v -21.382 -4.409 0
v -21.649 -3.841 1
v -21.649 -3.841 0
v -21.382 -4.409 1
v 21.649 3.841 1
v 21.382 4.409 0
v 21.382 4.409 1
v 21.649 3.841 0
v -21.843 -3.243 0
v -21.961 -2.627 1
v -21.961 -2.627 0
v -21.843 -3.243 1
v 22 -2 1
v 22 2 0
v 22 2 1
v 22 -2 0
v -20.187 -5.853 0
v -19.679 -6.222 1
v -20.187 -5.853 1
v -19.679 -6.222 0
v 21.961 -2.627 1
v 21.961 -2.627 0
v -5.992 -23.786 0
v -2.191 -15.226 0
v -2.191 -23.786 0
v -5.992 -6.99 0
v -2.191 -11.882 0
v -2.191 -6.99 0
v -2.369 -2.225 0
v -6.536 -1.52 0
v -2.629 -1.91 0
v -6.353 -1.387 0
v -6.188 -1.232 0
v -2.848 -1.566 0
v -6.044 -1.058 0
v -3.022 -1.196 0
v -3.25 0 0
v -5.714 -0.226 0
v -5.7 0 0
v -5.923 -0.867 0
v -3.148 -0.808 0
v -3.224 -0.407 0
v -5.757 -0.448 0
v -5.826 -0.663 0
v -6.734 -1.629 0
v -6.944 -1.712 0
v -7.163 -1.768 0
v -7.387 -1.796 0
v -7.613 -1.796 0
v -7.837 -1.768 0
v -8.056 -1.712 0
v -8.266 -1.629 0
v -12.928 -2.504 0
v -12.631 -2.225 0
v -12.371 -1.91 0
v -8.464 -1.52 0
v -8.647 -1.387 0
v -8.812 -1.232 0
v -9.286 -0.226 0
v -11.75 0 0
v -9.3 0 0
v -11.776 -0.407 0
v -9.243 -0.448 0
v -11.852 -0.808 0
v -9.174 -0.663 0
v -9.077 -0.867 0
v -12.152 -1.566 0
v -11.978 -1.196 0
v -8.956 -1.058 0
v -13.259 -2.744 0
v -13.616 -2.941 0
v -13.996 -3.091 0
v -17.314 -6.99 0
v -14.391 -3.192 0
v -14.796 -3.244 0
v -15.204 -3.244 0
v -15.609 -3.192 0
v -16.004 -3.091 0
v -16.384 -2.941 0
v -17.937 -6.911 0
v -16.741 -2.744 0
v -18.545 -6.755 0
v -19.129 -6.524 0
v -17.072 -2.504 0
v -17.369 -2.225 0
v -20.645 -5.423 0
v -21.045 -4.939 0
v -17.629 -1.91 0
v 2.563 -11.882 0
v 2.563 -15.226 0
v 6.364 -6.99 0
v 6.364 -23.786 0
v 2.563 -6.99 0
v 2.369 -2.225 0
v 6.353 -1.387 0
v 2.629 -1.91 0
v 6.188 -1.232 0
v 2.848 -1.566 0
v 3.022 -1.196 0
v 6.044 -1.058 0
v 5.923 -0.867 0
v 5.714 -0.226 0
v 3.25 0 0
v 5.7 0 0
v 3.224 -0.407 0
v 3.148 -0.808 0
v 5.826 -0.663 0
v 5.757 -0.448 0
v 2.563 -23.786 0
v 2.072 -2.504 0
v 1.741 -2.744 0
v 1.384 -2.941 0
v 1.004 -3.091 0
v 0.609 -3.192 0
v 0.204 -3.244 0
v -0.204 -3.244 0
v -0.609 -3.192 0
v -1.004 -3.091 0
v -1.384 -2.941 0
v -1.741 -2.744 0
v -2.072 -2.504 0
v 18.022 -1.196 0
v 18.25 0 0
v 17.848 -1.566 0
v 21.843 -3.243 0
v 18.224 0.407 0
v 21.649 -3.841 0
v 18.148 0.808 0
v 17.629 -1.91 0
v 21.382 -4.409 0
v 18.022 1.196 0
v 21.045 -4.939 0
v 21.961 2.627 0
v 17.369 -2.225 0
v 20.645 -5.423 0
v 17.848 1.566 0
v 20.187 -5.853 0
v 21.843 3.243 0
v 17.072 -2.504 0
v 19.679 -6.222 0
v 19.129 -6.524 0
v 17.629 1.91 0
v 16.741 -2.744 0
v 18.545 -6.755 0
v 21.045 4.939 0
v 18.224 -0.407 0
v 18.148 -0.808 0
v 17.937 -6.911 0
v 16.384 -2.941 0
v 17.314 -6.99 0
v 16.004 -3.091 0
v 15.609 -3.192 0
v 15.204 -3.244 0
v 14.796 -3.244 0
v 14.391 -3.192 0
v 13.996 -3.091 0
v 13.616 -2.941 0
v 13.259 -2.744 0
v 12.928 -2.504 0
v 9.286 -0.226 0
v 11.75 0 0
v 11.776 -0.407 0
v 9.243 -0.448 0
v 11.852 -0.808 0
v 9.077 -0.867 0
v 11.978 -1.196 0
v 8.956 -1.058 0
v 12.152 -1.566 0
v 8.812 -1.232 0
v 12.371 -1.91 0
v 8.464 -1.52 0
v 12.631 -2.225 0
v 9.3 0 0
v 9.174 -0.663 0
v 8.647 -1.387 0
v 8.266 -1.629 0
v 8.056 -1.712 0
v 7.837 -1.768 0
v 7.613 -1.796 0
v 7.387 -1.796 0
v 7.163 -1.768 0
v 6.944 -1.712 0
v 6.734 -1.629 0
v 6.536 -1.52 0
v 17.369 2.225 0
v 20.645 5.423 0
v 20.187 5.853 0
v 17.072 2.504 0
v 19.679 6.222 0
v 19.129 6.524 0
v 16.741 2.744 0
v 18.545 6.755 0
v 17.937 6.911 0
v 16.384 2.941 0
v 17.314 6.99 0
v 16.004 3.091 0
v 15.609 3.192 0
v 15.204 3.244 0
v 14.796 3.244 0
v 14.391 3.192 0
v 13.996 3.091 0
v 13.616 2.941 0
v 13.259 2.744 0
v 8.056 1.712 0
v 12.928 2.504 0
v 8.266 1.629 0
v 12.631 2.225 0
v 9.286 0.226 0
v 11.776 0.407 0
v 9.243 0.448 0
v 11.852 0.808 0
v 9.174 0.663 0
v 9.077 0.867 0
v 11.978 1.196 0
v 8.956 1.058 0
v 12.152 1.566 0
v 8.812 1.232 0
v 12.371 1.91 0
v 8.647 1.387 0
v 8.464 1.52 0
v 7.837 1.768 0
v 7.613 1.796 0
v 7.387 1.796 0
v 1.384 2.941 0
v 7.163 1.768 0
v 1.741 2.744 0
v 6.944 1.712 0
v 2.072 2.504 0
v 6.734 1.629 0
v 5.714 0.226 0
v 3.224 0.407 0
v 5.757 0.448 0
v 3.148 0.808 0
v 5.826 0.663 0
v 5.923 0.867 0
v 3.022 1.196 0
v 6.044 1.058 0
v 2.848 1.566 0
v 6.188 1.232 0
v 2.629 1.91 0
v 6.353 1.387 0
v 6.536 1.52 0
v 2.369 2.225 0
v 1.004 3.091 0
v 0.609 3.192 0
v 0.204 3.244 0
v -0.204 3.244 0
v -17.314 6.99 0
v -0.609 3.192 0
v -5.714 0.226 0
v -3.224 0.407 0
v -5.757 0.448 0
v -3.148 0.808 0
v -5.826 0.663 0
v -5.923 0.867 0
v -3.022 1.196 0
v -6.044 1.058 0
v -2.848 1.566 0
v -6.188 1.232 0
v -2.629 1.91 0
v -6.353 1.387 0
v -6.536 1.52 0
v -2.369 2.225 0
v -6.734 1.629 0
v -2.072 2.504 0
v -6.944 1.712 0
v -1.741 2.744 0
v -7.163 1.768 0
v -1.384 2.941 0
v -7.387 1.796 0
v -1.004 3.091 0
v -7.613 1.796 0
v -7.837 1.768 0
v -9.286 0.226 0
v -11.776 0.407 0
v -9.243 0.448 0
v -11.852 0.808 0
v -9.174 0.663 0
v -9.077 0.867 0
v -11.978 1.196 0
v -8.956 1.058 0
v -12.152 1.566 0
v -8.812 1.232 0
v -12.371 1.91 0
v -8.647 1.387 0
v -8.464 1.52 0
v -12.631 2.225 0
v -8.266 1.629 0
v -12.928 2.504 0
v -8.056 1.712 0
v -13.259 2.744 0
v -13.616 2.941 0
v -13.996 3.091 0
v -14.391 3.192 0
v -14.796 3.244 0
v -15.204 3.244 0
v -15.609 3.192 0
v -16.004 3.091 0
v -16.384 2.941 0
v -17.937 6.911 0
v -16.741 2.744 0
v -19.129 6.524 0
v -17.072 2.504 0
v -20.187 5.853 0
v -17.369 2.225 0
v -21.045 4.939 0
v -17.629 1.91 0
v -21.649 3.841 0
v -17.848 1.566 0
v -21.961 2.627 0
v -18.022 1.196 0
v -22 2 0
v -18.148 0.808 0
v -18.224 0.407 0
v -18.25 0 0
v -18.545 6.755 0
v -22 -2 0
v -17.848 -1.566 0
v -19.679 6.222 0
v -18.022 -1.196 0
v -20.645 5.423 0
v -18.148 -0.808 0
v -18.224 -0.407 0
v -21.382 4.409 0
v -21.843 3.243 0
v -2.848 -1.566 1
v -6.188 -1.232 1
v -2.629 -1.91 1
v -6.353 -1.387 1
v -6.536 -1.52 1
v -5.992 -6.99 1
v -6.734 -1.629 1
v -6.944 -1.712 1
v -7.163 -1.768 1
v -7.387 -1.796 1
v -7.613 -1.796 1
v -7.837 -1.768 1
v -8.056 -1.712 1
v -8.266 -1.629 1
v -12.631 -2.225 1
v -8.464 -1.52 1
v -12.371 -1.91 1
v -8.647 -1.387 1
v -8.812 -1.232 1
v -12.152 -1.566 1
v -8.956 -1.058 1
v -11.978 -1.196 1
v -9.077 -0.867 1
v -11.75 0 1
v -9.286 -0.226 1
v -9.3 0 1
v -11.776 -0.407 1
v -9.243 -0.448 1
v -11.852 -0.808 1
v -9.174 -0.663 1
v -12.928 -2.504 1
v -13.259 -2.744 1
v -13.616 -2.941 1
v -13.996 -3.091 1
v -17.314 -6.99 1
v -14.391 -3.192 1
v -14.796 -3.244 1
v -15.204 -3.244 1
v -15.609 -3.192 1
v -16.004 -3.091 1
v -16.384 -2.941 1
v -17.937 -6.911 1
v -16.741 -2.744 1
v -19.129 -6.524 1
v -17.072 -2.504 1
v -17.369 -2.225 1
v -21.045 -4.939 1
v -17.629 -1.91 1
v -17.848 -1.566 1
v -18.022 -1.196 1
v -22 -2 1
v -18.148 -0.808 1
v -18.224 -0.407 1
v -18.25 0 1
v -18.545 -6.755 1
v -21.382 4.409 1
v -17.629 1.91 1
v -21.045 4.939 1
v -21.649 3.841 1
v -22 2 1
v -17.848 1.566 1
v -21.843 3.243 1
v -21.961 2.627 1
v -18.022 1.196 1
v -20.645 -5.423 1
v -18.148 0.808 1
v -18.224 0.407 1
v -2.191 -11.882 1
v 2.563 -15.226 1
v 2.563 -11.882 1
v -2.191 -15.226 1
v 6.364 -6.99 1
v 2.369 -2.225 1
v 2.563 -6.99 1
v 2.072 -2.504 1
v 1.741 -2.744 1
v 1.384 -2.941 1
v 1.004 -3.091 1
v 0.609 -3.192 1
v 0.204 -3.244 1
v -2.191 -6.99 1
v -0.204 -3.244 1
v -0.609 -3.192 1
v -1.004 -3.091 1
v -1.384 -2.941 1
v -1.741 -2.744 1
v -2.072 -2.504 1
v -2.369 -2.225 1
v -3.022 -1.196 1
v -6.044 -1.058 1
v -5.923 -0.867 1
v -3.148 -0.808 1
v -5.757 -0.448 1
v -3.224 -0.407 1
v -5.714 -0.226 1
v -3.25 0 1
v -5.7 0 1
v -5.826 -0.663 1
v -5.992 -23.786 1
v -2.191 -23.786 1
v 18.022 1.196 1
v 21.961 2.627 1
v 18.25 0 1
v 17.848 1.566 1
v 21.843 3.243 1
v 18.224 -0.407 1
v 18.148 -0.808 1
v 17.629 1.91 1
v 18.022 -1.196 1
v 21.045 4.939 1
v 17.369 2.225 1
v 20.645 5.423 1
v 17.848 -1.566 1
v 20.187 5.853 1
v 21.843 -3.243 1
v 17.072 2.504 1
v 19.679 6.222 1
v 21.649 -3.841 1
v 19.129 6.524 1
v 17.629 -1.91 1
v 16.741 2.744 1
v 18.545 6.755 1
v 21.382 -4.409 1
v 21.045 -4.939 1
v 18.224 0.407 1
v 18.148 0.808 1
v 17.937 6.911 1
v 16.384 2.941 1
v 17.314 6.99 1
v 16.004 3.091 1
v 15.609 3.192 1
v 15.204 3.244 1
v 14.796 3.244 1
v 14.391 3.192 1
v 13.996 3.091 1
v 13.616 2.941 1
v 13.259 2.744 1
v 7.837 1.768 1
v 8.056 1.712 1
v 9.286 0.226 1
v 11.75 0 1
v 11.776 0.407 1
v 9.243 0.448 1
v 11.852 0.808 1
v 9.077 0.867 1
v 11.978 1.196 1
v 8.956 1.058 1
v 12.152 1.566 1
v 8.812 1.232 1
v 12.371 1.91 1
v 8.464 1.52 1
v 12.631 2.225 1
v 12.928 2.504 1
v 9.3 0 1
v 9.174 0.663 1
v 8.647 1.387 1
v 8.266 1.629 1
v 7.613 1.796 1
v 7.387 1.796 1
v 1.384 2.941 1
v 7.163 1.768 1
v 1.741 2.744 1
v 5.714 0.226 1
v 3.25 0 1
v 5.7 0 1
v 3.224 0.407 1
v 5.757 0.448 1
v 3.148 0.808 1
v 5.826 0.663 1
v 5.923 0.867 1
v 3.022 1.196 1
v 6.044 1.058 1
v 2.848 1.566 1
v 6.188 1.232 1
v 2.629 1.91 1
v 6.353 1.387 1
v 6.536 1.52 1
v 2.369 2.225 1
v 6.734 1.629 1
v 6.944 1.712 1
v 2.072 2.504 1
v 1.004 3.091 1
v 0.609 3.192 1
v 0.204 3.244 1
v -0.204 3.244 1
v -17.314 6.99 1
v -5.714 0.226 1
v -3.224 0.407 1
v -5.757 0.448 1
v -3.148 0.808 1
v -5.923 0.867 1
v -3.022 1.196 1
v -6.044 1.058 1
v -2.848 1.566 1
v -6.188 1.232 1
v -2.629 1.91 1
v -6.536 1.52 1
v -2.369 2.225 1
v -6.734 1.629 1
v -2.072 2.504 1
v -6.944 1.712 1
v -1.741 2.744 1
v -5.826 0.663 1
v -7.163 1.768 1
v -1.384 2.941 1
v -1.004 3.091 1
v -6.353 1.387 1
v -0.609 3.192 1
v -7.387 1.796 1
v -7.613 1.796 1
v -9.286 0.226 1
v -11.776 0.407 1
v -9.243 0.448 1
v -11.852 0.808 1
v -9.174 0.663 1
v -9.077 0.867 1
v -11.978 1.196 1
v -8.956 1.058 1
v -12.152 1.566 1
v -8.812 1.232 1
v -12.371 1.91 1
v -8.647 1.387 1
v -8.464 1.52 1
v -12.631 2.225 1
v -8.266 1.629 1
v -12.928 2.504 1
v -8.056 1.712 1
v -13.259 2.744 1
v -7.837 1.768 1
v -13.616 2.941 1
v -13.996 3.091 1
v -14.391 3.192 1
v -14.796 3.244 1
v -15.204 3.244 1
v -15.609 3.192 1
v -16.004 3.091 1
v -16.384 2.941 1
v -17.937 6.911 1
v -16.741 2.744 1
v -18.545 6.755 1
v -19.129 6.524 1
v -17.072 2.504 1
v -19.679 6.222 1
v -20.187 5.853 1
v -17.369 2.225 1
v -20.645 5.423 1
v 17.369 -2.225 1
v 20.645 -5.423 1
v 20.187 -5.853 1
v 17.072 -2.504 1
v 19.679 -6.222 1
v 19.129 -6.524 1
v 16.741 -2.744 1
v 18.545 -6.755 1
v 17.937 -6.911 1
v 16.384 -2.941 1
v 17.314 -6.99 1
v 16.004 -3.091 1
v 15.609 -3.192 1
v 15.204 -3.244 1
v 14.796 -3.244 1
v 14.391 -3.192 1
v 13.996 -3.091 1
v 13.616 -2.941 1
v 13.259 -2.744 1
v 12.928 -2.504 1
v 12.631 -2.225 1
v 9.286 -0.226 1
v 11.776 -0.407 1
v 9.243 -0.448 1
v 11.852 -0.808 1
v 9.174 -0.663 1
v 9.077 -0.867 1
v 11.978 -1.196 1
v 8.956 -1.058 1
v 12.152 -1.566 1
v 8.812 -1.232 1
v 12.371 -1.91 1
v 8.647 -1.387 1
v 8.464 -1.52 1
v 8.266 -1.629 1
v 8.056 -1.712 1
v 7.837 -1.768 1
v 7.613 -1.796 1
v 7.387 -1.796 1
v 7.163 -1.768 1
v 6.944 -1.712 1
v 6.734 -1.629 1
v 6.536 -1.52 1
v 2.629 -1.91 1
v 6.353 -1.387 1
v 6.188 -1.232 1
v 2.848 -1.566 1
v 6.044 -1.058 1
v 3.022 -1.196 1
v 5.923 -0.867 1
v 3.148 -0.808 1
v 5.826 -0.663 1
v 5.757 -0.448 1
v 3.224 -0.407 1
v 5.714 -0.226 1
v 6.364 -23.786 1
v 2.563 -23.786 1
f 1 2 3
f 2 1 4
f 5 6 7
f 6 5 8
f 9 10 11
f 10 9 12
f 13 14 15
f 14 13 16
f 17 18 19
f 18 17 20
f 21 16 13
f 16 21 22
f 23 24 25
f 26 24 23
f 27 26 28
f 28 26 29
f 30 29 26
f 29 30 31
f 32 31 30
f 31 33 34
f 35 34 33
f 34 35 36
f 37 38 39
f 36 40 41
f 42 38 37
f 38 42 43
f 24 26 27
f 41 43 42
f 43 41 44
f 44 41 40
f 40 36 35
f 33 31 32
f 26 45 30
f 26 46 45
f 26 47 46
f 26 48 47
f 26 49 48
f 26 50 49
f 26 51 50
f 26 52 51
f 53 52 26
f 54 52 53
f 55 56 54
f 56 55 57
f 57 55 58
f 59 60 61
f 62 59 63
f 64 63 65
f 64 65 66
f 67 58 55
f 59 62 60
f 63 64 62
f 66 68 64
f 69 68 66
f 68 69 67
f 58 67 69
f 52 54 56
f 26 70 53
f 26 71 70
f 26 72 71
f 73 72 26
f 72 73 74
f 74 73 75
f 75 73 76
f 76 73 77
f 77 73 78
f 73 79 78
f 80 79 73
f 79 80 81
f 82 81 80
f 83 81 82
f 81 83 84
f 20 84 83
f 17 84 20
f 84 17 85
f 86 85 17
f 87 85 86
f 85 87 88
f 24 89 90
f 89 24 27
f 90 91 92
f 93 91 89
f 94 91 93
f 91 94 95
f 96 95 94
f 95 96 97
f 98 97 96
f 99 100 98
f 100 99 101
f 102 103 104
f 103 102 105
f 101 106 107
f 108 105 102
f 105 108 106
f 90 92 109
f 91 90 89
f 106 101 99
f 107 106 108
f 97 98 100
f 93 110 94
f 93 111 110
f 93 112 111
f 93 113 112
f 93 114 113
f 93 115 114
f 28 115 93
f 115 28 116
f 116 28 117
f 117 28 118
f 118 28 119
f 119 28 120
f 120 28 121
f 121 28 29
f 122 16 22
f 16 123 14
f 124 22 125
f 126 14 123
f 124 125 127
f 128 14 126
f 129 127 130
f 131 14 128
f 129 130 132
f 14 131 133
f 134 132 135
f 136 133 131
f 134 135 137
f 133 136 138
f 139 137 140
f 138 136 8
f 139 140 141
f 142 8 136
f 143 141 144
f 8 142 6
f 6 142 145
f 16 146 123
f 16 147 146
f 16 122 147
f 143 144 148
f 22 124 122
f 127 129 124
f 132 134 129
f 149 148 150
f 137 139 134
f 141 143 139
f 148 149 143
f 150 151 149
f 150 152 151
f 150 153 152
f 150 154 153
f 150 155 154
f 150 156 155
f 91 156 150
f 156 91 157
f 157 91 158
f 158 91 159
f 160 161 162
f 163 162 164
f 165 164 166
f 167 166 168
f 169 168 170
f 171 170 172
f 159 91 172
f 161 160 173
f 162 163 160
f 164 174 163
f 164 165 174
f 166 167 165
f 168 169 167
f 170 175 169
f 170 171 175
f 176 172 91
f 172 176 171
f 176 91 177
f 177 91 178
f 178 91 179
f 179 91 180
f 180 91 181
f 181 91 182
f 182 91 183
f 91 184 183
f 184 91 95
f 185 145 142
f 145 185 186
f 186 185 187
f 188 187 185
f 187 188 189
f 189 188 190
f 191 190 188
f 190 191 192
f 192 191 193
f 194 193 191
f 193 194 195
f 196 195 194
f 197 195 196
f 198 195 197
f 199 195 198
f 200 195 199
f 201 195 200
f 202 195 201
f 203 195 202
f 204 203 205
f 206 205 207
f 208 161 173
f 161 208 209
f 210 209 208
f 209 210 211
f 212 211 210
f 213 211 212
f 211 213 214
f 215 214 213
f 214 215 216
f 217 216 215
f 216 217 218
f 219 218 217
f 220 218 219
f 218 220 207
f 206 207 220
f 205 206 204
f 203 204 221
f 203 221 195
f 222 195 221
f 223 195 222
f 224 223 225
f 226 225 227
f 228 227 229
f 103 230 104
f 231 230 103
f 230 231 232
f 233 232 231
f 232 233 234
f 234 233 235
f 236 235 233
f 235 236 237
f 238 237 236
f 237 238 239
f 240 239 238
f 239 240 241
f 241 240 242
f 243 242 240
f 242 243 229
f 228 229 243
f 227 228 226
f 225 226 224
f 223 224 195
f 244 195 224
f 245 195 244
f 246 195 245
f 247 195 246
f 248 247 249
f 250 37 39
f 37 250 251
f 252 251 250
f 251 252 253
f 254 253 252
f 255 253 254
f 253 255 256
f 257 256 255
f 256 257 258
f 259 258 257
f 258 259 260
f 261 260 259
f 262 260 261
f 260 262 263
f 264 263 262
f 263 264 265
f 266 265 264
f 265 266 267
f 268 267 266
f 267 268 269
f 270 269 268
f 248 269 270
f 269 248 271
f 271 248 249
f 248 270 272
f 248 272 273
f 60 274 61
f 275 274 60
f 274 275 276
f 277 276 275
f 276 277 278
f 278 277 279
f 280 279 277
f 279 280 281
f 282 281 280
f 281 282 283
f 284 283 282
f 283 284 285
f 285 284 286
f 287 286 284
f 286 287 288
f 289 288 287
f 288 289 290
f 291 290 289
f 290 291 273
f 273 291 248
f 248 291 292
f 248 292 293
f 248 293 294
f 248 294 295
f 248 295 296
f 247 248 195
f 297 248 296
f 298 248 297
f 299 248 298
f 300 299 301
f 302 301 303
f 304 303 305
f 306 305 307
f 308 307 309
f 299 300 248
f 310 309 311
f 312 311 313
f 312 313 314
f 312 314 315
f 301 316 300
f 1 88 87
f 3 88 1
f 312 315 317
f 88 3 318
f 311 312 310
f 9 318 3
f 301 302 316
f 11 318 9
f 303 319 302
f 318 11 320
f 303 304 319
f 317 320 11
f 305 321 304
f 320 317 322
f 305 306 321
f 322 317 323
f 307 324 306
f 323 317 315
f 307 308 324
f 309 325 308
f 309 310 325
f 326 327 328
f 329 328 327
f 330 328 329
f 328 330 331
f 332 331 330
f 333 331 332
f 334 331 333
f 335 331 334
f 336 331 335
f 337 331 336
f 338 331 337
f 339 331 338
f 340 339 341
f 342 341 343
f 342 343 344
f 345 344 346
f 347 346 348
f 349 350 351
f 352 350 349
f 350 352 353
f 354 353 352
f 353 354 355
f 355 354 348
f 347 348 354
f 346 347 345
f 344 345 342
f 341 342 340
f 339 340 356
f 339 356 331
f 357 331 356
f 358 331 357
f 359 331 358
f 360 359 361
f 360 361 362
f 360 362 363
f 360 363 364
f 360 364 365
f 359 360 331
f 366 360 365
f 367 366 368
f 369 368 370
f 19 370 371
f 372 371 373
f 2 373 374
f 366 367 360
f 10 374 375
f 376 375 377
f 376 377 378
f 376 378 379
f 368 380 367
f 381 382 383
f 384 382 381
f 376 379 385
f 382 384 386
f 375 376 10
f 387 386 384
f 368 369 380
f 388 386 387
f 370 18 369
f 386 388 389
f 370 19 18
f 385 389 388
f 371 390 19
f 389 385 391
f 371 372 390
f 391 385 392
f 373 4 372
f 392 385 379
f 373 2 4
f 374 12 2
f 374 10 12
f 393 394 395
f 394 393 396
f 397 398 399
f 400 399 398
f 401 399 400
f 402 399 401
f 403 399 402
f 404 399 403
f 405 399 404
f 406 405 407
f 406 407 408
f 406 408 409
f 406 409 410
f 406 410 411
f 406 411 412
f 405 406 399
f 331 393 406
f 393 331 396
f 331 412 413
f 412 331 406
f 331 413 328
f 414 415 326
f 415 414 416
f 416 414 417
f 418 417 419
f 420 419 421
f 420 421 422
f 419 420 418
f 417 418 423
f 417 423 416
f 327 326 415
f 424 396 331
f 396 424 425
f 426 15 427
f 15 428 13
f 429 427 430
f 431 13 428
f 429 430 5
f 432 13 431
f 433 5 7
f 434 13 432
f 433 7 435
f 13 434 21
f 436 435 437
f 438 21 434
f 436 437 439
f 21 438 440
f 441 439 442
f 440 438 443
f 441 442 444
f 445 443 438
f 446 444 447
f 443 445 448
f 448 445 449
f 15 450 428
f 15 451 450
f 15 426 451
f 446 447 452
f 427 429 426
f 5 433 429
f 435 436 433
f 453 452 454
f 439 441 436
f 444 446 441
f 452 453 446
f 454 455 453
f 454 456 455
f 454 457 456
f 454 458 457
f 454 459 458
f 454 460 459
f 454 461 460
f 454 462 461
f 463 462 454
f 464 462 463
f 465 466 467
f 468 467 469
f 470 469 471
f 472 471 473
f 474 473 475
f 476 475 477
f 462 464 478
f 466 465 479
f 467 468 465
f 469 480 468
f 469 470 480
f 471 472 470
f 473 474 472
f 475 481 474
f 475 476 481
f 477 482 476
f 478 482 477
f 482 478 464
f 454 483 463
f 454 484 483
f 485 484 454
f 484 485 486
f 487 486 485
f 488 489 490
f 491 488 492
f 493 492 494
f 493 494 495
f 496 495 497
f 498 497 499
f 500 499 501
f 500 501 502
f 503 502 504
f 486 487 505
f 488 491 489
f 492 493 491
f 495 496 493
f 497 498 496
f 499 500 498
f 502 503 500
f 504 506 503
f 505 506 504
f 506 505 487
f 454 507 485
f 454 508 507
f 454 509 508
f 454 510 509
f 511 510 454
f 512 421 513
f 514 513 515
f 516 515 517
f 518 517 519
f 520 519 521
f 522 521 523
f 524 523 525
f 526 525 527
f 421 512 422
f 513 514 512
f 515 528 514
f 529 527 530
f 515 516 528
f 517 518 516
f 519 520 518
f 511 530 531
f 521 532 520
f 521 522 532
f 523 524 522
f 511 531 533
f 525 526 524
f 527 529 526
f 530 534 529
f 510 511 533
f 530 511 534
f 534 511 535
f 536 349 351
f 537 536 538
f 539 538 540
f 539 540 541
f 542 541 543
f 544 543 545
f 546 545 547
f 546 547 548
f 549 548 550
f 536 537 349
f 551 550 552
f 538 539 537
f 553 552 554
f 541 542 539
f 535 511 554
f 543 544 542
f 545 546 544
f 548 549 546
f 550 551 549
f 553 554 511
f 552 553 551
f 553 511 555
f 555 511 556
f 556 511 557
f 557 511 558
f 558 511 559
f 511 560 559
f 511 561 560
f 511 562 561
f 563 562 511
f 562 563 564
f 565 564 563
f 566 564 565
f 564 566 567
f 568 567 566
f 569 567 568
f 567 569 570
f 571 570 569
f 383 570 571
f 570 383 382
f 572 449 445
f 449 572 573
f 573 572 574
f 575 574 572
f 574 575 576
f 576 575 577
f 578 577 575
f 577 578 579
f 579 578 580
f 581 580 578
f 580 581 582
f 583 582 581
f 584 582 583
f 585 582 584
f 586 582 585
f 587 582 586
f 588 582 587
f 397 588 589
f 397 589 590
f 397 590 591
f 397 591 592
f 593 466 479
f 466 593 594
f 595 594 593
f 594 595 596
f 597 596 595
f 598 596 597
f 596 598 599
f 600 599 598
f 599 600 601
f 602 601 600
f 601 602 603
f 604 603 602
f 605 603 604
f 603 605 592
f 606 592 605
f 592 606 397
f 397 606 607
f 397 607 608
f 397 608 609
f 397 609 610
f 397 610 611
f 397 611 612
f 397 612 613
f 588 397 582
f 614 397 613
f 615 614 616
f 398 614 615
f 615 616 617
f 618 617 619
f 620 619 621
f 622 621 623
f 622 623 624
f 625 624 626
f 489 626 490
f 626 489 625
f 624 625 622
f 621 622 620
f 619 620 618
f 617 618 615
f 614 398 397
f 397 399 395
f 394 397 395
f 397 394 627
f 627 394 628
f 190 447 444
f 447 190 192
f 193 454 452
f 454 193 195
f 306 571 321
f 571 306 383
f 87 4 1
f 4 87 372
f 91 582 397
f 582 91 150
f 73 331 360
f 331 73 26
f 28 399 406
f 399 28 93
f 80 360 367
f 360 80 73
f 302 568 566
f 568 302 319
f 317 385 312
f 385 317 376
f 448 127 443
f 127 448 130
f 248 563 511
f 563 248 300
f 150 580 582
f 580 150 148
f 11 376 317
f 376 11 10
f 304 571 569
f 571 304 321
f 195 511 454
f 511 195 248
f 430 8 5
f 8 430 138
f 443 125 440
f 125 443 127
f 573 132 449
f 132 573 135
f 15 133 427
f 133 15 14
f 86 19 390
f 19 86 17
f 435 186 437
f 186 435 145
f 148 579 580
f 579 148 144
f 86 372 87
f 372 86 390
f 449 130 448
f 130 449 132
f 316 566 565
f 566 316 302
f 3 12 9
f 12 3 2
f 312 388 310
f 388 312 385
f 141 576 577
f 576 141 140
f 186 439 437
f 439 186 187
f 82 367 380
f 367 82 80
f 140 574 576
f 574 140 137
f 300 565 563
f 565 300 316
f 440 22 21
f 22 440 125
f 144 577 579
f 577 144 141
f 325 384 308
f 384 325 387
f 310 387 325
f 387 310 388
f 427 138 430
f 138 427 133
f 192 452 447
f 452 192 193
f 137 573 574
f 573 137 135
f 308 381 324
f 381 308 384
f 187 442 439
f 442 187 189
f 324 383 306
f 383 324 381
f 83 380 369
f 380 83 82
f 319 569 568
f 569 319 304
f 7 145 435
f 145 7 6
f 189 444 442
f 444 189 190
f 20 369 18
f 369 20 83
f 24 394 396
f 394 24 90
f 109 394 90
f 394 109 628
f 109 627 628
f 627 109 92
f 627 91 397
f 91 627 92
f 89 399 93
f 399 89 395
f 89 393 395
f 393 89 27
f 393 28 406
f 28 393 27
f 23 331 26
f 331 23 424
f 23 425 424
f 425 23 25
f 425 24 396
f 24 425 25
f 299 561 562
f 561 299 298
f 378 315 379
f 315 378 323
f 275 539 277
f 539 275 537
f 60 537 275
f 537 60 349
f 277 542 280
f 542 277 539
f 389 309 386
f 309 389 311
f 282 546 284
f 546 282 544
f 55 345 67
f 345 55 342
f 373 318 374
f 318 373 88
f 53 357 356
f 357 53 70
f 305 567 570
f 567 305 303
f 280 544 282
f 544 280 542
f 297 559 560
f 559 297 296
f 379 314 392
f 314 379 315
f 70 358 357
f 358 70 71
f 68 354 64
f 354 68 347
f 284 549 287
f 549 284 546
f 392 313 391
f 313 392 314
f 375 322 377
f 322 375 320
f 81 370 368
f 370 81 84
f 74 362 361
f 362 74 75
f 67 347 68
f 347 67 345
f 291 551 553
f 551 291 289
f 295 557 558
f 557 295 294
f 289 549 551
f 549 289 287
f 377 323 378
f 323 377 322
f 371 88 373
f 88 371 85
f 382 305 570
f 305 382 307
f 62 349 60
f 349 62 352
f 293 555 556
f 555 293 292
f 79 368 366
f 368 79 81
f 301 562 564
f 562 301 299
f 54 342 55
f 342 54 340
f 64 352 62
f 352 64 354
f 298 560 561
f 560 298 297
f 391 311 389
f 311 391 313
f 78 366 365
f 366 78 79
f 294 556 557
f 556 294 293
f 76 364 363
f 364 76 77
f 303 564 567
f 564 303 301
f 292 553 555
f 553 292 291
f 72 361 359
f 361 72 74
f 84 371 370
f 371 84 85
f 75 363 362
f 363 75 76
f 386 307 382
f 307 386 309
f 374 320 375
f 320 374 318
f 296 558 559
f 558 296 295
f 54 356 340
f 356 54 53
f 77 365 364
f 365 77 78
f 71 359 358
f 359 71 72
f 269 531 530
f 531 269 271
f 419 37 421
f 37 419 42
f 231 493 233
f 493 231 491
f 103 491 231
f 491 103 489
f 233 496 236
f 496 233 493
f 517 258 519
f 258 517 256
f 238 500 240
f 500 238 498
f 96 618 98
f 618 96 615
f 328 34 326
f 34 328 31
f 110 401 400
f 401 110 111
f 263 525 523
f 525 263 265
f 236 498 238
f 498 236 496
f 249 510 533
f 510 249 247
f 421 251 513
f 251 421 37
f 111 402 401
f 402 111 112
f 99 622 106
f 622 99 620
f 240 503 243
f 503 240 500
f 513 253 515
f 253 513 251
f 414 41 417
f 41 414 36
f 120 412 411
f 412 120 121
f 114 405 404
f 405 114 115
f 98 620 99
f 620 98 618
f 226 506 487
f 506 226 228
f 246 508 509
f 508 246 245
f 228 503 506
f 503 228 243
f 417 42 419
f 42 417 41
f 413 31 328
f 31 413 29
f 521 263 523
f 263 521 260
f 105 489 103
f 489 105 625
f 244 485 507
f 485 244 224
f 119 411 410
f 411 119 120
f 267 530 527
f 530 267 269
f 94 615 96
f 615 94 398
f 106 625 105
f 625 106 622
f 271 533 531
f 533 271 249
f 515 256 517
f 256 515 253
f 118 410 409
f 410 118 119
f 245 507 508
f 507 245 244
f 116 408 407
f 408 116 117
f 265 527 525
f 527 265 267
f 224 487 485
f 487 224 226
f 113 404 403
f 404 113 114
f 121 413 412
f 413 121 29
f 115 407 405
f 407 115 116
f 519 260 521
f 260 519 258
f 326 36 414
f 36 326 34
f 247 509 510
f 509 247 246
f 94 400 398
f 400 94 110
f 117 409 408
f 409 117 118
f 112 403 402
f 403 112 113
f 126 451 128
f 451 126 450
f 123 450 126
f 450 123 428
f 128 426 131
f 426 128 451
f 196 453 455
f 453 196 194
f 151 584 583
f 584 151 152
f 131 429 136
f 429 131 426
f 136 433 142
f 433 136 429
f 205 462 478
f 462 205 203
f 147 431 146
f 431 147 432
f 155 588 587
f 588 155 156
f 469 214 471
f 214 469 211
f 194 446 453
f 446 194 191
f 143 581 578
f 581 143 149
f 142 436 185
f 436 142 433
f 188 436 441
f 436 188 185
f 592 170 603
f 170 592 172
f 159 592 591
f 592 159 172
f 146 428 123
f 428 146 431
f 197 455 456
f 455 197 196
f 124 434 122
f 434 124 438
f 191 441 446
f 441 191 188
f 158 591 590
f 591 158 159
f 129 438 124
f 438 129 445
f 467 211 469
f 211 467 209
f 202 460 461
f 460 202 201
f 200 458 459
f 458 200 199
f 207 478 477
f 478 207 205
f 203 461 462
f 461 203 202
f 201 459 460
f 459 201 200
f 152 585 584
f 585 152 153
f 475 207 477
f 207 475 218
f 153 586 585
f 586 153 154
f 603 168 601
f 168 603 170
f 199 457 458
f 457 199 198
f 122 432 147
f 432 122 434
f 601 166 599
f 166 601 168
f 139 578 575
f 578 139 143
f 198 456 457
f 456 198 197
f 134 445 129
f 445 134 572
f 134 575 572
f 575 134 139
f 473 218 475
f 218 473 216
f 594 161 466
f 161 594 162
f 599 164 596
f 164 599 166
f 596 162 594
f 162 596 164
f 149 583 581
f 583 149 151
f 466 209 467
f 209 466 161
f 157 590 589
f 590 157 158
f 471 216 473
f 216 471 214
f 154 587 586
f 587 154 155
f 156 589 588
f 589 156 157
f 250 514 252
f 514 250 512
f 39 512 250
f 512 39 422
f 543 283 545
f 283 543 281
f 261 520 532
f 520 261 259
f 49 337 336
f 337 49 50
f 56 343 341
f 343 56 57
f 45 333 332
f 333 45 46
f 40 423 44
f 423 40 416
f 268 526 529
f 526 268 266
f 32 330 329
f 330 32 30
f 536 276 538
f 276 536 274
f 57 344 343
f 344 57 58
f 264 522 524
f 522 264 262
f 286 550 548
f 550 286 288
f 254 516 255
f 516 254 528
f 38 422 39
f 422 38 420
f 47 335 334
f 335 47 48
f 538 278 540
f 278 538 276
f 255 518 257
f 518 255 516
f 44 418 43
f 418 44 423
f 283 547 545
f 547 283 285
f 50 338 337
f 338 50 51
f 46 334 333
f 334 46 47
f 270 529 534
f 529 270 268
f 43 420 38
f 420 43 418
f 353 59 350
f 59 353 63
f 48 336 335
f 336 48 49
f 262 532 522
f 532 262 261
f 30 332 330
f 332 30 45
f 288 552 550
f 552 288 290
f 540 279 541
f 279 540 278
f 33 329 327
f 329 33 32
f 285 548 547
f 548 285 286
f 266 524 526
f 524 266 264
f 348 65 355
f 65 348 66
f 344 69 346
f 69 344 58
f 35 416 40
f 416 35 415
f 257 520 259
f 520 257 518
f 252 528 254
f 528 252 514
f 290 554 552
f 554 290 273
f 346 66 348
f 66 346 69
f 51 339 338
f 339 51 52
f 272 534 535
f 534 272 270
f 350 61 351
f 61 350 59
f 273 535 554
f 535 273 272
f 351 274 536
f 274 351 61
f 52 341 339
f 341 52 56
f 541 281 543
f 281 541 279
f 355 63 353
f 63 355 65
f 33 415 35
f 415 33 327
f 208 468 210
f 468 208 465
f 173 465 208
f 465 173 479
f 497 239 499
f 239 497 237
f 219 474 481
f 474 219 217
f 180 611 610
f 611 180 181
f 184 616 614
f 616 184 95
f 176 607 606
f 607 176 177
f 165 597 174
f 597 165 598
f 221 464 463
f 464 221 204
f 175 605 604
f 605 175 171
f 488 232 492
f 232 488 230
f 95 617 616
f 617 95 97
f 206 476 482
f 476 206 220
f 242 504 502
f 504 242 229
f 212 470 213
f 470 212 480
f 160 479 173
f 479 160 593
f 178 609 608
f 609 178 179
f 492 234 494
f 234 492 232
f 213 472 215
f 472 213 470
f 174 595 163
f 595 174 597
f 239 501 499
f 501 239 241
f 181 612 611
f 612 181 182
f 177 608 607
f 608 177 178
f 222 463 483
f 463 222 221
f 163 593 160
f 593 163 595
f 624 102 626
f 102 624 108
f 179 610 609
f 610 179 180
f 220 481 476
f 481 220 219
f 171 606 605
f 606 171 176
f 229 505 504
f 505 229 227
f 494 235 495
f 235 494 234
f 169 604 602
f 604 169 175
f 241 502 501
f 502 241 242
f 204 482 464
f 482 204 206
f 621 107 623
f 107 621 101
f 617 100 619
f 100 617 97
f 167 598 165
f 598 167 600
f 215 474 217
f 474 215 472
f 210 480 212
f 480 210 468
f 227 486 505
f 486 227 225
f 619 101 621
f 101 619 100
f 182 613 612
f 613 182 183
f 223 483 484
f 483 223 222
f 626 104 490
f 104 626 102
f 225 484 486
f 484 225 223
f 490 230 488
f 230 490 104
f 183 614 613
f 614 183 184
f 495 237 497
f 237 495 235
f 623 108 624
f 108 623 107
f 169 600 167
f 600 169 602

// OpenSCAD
$fn = 50;


difference() {
	union() {
		*color(alpha = 1.0000000000, c = "gray") {
			translate(v = [0, 14, 0]) {
				linear_extrude(height = 1) {
					text(font = "Arial:style=Bold", halign = "center", size = 4.5000000000, text = "COMMENT description oobb_plate_shape_p_type_1_depth_3_width_1_thickness_h_extra_oobb_size", valign = "center");
				}
			}
		}
		hull() {
			translate(v = [-17.0000000000, 2.0000000000, 0]) {
				cylinder(h = 1, r = 5);
			}
			translate(v = [17.0000000000, 2.0000000000, 0]) {
				cylinder(h = 1, r = 5);
			}
			translate(v = [-17.0000000000, -2.0000000000, 0]) {
				cylinder(h = 1, r = 5);
			}
			translate(v = [17.0000000000, -2.0000000000, 0]) {
				cylinder(h = 1, r = 5);
			}
		}
		translate(v = [0, -5, 0]) {
			linear_extrude(height = 1) {
				text(font = "DejaVu Sans Mono:style=Bold", halign = "center", size = 19.0000000000, text = "H", valign = "top");
			}
		}
	}
	union() {
		*color(alpha = 1.0000000000, c = "gray") {
			translate(v = [0, 14, 0]) {
				linear_extrude(height = 1) {
					text(font = "Arial:style=Bold", halign = "center", size = 4.5000000000, text = "COMMENT description oobb_holes_shape_n_type_3_width_1_thickness_h_extra_oobb_size_1_height_'all'_holes_true_both_holes", valign = "center");
				}
			}
		}
		translate(v = [-15.0000000000, 0.0000000000, 0]) {
			translate(v = [0, 0, -50]) {
				cylinder(h = 100, r = 3.2500000000);
			}
		}
		translate(v = [0, 0, -50]) {
			cylinder(h = 100, r = 3.2500000000);
		}
		translate(v = [15.0000000000, 0.0000000000, 0]) {
			translate(v = [0, 0, -50]) {
				cylinder(h = 100, r = 3.2500000000);
			}
		}
		translate(v = [-15.0000000000, 0.0000000000, 0]) {
			translate(v = [0, 0, -50]) {
				cylinder(h = 100, r = 1.8000000000);
			}
		}
		translate(v = [-7.5000000000, 0.0000000000, 0]) {
			translate(v = [0, 0, -50]) {
				cylinder(h = 100, r = 1.8000000000);
			}
		}
		translate(v = [0, 0, -50]) {
			cylinder(h = 100, r = 1.8000000000);
		}
		translate(v = [7.5000000000, 0.0000000000, 0]) {
			translate(v = [0, 0, -50]) {
				cylinder(h = 100, r = 1.8000000000);
			}
		}
		translate(v = [15.0000000000, 0.0000000000, 0]) {
			translate(v = [0, 0, -50]) {
				cylinder(h = 100, r = 1.8000000000);
			}
		}
	}
}
